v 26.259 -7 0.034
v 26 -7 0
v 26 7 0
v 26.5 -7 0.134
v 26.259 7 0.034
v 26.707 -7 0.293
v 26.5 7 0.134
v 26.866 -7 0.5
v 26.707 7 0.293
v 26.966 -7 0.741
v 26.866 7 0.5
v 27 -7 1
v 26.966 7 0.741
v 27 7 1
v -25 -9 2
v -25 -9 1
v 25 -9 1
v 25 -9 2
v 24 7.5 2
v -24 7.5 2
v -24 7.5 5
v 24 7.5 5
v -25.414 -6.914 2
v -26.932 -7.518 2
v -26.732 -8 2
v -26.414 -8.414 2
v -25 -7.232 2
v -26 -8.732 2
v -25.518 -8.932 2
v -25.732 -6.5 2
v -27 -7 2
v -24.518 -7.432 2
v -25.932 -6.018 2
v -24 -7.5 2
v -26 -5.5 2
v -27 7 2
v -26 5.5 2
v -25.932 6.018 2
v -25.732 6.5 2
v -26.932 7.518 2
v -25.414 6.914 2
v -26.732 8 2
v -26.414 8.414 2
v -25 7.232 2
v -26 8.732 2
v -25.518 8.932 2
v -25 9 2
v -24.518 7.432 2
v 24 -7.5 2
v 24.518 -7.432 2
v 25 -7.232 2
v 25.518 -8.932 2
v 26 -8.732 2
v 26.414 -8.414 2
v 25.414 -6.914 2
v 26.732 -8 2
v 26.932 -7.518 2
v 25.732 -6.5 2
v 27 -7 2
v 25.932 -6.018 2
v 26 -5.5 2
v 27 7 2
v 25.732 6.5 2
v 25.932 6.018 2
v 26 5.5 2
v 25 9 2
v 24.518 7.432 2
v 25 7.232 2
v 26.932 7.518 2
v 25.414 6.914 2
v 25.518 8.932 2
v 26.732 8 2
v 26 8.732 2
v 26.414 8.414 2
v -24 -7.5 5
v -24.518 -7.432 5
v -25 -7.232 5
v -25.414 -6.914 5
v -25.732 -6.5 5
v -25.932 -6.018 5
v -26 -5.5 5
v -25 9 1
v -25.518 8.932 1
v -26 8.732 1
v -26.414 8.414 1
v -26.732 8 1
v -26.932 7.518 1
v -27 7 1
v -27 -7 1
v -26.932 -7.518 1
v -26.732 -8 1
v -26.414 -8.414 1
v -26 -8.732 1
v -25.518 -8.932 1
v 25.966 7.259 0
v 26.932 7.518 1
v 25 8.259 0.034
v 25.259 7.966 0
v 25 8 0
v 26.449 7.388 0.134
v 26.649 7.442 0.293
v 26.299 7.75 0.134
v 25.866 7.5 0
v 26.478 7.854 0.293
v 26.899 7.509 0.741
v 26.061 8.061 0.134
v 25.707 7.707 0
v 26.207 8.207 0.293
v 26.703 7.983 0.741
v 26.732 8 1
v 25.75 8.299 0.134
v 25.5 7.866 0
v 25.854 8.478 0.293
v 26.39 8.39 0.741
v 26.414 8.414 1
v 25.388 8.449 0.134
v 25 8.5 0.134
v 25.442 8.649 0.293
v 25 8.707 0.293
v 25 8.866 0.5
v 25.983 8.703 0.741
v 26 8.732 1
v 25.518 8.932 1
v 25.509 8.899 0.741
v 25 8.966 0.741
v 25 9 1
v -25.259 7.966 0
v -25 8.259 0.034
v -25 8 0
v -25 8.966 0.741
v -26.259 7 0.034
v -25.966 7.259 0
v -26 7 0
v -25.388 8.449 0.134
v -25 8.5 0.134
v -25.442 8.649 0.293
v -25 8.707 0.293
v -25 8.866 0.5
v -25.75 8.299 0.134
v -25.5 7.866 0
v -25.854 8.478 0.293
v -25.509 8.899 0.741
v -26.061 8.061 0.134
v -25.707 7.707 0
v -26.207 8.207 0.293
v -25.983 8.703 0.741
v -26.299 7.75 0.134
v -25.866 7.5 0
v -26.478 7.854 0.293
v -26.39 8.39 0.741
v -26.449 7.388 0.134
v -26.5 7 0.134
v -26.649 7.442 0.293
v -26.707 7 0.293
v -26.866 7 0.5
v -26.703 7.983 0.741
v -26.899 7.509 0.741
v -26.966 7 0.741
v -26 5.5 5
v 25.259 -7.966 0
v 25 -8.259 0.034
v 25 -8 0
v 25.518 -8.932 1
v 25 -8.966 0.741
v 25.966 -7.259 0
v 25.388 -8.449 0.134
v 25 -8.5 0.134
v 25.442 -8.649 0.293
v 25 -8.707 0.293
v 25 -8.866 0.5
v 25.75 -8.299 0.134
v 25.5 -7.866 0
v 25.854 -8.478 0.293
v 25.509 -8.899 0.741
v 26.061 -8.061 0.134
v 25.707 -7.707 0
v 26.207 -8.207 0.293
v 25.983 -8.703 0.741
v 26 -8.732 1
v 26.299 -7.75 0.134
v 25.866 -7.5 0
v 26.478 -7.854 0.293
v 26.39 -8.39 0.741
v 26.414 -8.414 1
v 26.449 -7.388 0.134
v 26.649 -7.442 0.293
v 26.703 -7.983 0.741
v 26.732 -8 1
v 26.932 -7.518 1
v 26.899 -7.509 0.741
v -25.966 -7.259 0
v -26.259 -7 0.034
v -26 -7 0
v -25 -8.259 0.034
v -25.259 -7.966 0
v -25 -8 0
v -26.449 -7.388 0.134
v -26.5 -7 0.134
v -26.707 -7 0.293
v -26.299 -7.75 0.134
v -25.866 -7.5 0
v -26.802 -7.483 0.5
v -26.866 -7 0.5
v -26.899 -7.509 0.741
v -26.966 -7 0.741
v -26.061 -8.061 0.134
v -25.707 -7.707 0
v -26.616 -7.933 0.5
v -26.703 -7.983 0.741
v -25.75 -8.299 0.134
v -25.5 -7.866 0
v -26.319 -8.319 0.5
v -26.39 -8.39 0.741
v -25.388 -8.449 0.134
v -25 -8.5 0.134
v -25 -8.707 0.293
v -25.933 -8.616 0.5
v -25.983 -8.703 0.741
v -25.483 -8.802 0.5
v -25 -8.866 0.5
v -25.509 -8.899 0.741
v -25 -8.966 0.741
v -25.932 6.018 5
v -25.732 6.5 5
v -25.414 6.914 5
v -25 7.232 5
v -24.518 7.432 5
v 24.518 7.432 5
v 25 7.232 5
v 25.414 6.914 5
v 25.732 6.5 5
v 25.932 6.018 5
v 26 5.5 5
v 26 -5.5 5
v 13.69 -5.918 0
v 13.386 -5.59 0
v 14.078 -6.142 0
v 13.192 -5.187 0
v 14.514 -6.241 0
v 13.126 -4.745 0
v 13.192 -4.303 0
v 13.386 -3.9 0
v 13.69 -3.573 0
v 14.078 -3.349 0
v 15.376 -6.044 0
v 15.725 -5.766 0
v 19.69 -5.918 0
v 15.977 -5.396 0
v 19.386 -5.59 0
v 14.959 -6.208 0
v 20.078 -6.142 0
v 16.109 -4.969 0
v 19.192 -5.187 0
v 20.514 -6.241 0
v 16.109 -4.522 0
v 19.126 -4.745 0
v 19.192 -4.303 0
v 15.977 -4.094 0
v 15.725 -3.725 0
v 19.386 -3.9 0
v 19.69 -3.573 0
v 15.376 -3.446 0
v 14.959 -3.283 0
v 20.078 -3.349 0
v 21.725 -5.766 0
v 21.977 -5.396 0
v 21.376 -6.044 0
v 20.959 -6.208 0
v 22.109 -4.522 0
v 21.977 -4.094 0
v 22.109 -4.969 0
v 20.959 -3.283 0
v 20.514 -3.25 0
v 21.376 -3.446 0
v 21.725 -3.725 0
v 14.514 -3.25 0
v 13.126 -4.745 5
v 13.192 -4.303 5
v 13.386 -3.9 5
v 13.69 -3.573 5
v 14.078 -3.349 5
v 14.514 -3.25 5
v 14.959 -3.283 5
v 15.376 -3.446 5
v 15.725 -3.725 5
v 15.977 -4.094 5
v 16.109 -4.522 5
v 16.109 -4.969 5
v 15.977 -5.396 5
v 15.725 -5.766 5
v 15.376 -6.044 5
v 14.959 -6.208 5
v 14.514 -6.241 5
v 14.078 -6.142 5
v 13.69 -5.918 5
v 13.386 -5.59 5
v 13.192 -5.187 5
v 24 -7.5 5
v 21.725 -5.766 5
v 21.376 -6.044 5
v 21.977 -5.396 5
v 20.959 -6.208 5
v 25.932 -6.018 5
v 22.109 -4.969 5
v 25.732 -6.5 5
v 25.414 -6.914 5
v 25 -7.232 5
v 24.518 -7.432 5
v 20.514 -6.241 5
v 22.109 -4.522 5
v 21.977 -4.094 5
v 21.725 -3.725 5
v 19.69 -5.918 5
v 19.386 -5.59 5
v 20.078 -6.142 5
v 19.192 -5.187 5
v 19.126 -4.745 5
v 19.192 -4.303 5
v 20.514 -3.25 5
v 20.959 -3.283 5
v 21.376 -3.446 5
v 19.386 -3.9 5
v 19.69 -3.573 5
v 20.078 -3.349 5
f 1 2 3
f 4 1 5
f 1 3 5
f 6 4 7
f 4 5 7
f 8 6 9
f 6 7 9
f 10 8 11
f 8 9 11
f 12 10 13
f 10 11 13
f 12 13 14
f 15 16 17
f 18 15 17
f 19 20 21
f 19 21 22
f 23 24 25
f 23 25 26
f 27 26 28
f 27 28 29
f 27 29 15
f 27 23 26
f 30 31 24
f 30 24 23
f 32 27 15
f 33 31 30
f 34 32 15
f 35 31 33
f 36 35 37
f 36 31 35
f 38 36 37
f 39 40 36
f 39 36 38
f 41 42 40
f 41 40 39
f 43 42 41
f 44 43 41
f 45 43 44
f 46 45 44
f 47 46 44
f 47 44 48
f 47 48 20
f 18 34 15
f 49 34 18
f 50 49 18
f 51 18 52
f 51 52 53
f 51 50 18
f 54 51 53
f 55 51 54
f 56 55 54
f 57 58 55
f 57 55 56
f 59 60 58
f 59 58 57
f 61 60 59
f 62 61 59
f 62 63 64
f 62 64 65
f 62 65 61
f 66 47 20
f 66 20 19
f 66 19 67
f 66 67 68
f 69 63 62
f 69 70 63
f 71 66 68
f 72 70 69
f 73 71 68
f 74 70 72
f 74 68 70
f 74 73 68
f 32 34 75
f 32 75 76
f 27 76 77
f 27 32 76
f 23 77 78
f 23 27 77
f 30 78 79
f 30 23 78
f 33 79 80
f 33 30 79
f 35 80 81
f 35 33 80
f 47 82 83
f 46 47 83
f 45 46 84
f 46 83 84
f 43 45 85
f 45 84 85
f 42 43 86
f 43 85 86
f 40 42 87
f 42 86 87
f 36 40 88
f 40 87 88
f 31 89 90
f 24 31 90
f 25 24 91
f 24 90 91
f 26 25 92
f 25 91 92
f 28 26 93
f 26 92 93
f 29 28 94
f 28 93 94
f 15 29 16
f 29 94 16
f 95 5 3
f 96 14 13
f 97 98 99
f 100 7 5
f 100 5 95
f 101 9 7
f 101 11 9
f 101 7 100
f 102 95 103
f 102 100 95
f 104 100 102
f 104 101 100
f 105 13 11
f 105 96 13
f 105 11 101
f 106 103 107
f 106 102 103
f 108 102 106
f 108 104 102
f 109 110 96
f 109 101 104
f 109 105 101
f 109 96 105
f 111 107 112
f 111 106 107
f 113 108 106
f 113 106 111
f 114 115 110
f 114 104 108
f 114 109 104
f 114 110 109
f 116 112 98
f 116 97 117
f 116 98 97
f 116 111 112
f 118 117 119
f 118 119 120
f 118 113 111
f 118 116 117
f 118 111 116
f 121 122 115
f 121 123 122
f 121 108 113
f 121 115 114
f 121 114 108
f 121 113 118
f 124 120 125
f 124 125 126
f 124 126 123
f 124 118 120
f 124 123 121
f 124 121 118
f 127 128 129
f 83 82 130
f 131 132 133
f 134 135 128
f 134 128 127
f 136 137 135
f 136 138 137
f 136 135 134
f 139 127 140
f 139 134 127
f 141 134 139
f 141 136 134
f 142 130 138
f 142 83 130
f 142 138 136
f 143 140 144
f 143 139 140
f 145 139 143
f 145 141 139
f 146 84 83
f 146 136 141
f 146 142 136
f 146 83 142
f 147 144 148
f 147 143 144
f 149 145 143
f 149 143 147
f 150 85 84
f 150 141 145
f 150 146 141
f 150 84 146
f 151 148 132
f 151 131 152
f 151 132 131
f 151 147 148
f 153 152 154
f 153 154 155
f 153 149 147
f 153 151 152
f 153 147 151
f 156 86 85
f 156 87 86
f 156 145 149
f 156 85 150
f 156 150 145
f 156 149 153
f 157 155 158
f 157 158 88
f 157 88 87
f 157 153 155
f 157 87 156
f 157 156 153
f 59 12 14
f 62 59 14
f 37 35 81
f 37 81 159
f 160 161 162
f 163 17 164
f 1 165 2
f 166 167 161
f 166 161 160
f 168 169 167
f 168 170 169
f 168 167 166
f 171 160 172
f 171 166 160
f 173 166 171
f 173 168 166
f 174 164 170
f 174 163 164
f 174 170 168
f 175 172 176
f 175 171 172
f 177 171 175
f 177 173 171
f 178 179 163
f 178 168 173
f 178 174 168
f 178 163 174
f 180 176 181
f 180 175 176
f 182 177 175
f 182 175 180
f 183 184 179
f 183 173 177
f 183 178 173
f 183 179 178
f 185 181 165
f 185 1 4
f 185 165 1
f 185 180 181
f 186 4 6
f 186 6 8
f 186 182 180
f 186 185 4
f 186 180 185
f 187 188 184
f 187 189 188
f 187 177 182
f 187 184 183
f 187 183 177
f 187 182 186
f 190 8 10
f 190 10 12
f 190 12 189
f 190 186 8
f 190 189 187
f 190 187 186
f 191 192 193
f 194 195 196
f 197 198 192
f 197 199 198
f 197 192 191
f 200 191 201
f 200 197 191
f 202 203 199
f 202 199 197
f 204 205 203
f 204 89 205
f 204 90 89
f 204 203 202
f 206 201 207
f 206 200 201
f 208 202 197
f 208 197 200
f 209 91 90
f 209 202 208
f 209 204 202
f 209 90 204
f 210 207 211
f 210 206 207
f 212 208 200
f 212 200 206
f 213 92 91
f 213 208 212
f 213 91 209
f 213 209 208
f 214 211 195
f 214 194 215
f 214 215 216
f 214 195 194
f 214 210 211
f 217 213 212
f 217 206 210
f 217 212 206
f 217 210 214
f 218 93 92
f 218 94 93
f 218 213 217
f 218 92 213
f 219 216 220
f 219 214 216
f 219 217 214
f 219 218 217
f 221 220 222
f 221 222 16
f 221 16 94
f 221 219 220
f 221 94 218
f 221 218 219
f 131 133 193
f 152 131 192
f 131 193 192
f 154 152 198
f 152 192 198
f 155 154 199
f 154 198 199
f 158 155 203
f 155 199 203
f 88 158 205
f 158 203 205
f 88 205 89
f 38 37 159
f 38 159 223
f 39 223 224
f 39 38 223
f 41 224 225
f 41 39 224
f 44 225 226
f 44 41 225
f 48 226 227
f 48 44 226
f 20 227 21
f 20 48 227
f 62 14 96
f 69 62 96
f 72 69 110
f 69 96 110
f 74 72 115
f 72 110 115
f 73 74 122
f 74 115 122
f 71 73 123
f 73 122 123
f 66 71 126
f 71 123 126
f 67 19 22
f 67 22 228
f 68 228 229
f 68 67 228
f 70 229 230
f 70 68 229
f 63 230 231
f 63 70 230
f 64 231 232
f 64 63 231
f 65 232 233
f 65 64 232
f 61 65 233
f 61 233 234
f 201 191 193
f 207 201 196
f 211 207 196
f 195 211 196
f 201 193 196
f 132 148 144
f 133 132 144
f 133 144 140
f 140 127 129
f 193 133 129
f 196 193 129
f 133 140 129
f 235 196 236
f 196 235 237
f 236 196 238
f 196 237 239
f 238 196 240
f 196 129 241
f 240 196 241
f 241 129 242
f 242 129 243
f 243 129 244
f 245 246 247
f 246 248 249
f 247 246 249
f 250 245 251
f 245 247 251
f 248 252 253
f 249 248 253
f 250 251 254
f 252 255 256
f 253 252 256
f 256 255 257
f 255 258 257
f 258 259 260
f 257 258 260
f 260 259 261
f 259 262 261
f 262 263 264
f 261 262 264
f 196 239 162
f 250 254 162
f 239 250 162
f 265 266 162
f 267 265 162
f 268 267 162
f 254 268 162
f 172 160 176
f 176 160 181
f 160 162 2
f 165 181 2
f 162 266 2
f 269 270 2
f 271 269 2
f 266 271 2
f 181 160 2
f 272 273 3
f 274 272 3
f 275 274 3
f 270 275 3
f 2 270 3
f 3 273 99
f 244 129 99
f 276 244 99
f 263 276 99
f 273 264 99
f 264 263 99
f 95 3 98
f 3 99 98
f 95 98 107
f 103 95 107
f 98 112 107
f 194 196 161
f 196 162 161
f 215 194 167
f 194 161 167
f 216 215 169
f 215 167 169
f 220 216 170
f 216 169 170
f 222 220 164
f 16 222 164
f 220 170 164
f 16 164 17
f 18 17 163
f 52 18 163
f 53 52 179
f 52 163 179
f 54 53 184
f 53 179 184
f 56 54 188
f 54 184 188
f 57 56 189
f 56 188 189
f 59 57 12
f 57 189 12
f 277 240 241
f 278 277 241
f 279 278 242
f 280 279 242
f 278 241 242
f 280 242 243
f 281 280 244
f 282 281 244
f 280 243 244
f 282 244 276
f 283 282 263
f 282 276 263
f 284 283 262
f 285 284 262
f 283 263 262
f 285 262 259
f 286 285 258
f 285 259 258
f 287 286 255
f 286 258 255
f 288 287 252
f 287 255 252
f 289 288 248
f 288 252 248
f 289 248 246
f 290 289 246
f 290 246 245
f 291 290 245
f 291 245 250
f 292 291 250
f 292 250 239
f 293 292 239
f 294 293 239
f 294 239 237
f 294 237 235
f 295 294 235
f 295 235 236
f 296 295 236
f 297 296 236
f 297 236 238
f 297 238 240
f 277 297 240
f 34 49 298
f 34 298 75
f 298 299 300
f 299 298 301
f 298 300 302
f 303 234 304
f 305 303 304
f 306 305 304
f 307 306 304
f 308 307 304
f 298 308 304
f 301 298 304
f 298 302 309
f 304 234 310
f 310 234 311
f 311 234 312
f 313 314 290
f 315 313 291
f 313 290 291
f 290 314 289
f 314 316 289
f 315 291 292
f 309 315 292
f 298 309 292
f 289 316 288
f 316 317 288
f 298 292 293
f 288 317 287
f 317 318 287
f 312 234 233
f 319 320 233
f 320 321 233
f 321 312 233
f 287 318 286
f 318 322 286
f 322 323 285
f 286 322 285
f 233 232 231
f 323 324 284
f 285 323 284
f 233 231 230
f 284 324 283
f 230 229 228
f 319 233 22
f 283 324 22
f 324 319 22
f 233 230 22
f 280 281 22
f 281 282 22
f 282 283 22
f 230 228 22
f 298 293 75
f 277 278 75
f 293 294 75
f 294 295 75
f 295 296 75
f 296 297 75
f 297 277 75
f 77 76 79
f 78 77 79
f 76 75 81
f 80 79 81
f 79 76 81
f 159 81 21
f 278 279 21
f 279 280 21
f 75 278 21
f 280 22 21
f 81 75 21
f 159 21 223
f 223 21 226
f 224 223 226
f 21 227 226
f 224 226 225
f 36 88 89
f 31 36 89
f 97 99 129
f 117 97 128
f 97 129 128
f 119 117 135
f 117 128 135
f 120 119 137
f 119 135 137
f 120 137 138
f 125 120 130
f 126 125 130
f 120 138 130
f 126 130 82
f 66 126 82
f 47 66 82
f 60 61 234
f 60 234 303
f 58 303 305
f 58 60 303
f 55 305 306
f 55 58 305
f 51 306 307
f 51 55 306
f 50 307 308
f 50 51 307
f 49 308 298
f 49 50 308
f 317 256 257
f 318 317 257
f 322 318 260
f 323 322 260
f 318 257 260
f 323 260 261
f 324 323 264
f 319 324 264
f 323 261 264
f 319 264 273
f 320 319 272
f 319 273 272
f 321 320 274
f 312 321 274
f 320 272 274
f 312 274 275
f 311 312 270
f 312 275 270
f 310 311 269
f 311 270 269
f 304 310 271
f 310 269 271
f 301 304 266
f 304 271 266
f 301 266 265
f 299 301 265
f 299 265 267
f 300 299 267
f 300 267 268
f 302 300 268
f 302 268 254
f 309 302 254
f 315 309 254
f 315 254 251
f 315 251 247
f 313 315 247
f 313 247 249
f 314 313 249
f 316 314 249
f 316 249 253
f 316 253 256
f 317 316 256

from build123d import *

# Parameters (mm, degrees)
BOSS_EXTRUDE1_DEPTH = 2
BOSS_EXTRUDE2_DEPTH = 3
SKETCH4_R           = 1.5
CUT_EXTRUDE1_DEPTH  = 7
FILLET1_R           = 1


with BuildPart() as part:
    # Sketch1 → Boss-Extrude1 (new body)
    with BuildSketch(Plane.XY):
        with BuildLine():
            Line((25, 9), (-25, 9))
            ThreePointArc((-25, 9), (-26.414213562, 8.414213562), (-27, 7))
            Line((-27, 7), (-27, -7))
            ThreePointArc((-27, -7), (-26.414213562, -8.414213562), (-25, -9))
            Line((-25, -9), (25, -9))
            ThreePointArc((25, -9), (26.414213562, -8.414213562), (27, -7))
            Line((27, -7), (27, 7))
            ThreePointArc((27, 7), (26.414213562, 8.414213562), (25, 9))
        make_face()
    extrude(amount=BOSS_EXTRUDE1_DEPTH)

    # Sketch2 → Boss-Extrude2 (add)
    with BuildSketch(Plane.XY.offset(2)):
        with BuildLine():
            Line((24, -7.5), (-24, -7.5))
            ThreePointArc((-24, -7.5), (-25.414213562, -6.914213562), (-26, -5.5))
            Line((-26, -5.5), (-26, 5.5))
            ThreePointArc((-26, 5.5), (-25.414213562, 6.914213562), (-24, 7.5))
            Line((-24, 7.5), (24, 7.5))
            ThreePointArc((24, 7.5), (25.414213562, 6.914213562), (26, 5.5))
            Line((26, 5.5), (26, -5.5))
            ThreePointArc((26, -5.5), (25.414213562, -6.914213562), (24, -7.5))
        make_face()
    extrude(amount=BOSS_EXTRUDE2_DEPTH)

    # Sketch4 → Cut-Extrude1 (cut)
    with BuildSketch(Plane(origin=(0, 0, 0), x_dir=(-1, 0, 0), z_dir=(0, 0, -1))):
        with Locations((-20.625599185, -4.74532022)):
            Circle(SKETCH4_R)
        with Locations((-14.625599185, -4.74532022)):
            Circle(SKETCH4_R)
    extrude(amount=-CUT_EXTRUDE1_DEPTH, mode=Mode.SUBTRACT)

    # Fillet1
    fillet1_edges = [part.edges().sort_by_distance(p)[0] for p in [
        (0, -9, 0),
        (-26.414213562, -8.414213562, 0),
        (-27, 0, 0),
        (-26.414213562, 8.414213562, 0),
        (0, 9, 0),
        (26.414213562, 8.414213562, 0),
        (27, 0, 0),
        (26.414213562, -8.414213562, 0),
    ]]
    fillet(fillet1_edges, radius=FILLET1_R)


solid = part.part
